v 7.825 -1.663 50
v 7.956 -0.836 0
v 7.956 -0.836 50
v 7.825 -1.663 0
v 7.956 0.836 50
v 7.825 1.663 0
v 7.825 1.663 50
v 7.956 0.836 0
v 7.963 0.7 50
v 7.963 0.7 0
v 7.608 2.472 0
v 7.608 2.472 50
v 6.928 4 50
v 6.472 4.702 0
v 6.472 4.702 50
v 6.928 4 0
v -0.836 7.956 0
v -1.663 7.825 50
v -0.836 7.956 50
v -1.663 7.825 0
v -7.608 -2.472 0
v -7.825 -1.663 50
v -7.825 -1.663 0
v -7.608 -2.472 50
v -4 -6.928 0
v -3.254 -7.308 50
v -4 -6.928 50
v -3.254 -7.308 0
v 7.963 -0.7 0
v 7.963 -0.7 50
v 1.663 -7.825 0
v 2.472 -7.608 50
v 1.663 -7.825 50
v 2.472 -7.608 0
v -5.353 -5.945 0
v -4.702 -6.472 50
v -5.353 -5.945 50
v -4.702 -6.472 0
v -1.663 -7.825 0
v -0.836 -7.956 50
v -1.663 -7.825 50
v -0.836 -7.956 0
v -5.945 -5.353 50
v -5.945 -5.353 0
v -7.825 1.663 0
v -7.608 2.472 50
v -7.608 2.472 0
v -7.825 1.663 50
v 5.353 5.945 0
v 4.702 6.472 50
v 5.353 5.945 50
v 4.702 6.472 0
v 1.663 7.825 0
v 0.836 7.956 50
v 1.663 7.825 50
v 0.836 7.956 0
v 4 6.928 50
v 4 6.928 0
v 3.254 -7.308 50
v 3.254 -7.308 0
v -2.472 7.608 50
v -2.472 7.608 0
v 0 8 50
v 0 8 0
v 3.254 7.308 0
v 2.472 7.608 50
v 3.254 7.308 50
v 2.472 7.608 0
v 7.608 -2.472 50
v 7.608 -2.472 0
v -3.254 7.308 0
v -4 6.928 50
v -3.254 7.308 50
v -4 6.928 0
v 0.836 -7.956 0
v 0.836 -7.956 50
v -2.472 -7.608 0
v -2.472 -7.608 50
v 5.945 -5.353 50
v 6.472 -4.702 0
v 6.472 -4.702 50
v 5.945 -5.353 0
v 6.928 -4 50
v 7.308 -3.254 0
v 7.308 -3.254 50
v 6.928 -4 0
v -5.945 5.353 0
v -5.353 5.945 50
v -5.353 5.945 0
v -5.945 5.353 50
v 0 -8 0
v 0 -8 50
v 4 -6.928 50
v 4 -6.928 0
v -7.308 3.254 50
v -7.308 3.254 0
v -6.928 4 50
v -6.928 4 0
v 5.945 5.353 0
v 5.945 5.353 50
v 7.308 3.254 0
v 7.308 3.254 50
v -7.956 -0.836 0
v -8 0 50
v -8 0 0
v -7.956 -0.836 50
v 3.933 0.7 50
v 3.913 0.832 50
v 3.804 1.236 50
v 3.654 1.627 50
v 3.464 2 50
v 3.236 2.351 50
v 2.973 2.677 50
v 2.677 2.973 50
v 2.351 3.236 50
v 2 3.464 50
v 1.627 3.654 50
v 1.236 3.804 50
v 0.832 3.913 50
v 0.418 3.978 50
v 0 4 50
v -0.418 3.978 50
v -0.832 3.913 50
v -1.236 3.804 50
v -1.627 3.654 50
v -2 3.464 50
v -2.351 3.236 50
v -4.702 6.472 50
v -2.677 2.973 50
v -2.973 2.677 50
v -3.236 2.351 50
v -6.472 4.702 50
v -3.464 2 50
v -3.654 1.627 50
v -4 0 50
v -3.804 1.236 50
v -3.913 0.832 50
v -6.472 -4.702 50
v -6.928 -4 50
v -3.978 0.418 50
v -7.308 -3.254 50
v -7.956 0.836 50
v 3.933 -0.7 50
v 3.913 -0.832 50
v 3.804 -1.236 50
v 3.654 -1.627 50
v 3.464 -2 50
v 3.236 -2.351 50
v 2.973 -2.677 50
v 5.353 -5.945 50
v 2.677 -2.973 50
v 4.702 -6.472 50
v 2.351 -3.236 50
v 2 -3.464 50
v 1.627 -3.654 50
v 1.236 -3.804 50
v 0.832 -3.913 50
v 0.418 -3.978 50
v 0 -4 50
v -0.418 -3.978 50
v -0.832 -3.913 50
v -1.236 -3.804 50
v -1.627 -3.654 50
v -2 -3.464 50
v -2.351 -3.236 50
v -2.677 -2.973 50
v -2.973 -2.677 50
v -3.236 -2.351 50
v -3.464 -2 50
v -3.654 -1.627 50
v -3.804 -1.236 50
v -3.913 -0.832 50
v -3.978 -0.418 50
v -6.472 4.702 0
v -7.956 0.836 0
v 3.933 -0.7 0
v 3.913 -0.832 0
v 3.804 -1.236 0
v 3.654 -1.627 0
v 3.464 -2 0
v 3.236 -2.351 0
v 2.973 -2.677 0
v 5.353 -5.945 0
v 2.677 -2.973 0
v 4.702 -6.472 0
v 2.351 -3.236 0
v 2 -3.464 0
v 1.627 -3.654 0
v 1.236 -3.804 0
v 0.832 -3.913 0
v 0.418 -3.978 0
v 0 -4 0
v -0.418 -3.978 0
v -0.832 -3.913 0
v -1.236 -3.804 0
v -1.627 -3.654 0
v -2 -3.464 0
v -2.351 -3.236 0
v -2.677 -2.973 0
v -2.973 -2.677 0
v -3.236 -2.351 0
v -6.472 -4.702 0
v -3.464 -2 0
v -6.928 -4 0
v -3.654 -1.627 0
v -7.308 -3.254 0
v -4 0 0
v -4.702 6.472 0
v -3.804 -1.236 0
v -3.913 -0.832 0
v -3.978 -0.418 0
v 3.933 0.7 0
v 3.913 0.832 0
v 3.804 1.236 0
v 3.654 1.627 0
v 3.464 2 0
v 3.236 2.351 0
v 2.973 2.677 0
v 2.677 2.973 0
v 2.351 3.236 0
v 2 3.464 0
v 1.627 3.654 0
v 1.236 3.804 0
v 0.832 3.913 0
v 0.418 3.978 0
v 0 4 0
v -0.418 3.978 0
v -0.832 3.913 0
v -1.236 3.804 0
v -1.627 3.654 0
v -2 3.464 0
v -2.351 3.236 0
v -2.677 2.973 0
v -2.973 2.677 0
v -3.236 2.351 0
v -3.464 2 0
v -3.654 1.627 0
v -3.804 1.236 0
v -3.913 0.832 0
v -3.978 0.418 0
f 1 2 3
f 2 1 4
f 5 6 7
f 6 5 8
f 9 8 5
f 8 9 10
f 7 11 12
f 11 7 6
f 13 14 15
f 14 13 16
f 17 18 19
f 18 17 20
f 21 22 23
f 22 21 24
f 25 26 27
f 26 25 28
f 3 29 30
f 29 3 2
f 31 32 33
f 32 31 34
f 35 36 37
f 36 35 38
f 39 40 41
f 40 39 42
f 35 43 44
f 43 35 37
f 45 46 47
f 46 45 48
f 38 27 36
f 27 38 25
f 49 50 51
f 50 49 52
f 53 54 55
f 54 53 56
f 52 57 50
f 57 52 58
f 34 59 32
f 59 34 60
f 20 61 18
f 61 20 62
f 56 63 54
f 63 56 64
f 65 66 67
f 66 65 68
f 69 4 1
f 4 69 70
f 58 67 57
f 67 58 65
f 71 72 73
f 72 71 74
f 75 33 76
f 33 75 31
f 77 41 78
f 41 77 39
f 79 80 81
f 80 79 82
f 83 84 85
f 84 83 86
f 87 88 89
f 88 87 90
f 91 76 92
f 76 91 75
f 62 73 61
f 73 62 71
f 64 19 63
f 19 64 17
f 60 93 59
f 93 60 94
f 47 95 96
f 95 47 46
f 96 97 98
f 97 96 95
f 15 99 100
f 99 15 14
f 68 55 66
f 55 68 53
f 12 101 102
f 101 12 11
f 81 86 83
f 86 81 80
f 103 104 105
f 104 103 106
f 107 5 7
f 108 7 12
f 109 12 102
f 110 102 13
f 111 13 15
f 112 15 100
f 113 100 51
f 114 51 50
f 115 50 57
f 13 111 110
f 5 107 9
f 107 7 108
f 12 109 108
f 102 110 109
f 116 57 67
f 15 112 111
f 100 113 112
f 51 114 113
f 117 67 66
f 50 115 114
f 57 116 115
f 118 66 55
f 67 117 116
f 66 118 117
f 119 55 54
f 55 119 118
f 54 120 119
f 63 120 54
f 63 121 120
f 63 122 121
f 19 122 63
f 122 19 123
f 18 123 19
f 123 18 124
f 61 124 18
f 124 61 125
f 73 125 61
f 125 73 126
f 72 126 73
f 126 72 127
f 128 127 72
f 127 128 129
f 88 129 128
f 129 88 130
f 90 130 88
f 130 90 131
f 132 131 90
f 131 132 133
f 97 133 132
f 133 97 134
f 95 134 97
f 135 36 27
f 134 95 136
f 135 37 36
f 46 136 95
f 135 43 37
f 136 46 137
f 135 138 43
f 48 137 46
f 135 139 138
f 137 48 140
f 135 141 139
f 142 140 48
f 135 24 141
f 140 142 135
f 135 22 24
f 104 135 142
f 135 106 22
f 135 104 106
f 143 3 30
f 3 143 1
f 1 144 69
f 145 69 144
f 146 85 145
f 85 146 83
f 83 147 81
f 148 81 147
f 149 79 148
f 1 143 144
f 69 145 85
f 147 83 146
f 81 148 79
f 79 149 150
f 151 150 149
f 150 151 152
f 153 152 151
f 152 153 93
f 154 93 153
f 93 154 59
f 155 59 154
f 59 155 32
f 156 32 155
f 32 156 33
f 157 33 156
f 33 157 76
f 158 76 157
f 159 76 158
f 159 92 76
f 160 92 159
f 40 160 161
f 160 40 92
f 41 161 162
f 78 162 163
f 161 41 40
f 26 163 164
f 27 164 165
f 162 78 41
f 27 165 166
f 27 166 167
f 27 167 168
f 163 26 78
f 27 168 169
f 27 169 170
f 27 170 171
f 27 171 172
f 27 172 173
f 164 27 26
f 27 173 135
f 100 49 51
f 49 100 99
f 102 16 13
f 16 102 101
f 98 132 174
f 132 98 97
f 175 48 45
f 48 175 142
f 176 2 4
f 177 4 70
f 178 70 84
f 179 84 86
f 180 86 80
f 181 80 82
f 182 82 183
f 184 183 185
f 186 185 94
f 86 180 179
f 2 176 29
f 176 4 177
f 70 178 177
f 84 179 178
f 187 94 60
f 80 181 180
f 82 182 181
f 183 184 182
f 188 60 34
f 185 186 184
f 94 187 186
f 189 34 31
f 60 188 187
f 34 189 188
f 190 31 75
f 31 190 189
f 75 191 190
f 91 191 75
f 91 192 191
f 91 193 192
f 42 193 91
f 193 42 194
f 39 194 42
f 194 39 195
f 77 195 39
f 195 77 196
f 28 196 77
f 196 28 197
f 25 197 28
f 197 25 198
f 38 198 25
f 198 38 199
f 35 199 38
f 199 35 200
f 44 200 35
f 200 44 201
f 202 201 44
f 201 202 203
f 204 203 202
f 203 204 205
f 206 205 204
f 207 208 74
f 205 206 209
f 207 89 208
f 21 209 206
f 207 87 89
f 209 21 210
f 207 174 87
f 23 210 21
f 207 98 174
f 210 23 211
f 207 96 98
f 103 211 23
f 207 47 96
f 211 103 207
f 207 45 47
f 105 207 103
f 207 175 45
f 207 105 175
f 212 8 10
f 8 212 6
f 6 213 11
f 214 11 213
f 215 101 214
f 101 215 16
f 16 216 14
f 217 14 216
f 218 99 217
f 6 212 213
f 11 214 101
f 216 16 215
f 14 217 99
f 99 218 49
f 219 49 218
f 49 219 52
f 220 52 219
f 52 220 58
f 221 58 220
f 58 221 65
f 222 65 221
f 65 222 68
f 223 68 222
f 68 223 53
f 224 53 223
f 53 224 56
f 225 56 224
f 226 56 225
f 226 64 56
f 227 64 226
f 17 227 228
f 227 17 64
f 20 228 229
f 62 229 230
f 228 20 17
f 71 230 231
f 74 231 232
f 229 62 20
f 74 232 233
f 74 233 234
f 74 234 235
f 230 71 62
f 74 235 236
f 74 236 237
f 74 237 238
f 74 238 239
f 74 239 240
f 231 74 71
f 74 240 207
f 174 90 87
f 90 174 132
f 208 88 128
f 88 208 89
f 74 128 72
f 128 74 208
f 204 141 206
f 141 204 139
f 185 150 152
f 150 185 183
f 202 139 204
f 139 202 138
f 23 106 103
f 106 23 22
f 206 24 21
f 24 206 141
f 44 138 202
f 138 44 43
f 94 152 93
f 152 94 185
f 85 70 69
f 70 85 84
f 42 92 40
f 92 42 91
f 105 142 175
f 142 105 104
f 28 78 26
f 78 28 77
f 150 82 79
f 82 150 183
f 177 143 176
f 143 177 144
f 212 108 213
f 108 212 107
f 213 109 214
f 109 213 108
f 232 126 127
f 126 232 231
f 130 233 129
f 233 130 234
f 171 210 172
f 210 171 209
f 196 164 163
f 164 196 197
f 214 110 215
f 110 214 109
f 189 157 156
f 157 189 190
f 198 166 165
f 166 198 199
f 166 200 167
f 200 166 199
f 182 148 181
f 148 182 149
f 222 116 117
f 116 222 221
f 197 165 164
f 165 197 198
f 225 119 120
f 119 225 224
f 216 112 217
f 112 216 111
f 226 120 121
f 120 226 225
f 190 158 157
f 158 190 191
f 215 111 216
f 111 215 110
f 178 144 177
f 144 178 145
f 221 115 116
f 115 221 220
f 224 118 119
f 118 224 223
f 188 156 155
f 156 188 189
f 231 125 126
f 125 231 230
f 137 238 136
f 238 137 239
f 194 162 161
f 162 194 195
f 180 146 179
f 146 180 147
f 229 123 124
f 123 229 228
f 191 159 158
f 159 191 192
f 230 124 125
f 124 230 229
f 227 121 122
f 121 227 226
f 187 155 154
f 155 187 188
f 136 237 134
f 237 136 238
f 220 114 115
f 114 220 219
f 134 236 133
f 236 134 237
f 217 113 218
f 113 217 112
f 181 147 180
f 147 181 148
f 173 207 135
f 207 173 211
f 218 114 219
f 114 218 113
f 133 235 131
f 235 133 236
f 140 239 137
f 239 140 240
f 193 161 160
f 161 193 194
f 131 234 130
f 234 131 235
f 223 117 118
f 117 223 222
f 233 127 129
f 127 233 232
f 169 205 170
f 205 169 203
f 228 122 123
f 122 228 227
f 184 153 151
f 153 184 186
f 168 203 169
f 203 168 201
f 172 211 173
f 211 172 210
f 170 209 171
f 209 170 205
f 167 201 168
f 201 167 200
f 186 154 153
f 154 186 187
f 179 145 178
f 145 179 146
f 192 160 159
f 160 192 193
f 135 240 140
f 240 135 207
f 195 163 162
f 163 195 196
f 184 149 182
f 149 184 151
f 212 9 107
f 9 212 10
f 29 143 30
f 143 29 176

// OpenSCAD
// Slotted roll pin.
$fn = 60;
eps = 0.02;
inner_d = 8;
outer_d = 16;
length = 50;
slot = 1.4;
difference() {
    cylinder(d=outer_d,h=length);
    translate([0,0,-eps]) cylinder(d=inner_d,h=length+2*eps);
    translate([0,-slot/2,-eps]) cube([outer_d/2+eps,slot,length+2*eps]);
}
